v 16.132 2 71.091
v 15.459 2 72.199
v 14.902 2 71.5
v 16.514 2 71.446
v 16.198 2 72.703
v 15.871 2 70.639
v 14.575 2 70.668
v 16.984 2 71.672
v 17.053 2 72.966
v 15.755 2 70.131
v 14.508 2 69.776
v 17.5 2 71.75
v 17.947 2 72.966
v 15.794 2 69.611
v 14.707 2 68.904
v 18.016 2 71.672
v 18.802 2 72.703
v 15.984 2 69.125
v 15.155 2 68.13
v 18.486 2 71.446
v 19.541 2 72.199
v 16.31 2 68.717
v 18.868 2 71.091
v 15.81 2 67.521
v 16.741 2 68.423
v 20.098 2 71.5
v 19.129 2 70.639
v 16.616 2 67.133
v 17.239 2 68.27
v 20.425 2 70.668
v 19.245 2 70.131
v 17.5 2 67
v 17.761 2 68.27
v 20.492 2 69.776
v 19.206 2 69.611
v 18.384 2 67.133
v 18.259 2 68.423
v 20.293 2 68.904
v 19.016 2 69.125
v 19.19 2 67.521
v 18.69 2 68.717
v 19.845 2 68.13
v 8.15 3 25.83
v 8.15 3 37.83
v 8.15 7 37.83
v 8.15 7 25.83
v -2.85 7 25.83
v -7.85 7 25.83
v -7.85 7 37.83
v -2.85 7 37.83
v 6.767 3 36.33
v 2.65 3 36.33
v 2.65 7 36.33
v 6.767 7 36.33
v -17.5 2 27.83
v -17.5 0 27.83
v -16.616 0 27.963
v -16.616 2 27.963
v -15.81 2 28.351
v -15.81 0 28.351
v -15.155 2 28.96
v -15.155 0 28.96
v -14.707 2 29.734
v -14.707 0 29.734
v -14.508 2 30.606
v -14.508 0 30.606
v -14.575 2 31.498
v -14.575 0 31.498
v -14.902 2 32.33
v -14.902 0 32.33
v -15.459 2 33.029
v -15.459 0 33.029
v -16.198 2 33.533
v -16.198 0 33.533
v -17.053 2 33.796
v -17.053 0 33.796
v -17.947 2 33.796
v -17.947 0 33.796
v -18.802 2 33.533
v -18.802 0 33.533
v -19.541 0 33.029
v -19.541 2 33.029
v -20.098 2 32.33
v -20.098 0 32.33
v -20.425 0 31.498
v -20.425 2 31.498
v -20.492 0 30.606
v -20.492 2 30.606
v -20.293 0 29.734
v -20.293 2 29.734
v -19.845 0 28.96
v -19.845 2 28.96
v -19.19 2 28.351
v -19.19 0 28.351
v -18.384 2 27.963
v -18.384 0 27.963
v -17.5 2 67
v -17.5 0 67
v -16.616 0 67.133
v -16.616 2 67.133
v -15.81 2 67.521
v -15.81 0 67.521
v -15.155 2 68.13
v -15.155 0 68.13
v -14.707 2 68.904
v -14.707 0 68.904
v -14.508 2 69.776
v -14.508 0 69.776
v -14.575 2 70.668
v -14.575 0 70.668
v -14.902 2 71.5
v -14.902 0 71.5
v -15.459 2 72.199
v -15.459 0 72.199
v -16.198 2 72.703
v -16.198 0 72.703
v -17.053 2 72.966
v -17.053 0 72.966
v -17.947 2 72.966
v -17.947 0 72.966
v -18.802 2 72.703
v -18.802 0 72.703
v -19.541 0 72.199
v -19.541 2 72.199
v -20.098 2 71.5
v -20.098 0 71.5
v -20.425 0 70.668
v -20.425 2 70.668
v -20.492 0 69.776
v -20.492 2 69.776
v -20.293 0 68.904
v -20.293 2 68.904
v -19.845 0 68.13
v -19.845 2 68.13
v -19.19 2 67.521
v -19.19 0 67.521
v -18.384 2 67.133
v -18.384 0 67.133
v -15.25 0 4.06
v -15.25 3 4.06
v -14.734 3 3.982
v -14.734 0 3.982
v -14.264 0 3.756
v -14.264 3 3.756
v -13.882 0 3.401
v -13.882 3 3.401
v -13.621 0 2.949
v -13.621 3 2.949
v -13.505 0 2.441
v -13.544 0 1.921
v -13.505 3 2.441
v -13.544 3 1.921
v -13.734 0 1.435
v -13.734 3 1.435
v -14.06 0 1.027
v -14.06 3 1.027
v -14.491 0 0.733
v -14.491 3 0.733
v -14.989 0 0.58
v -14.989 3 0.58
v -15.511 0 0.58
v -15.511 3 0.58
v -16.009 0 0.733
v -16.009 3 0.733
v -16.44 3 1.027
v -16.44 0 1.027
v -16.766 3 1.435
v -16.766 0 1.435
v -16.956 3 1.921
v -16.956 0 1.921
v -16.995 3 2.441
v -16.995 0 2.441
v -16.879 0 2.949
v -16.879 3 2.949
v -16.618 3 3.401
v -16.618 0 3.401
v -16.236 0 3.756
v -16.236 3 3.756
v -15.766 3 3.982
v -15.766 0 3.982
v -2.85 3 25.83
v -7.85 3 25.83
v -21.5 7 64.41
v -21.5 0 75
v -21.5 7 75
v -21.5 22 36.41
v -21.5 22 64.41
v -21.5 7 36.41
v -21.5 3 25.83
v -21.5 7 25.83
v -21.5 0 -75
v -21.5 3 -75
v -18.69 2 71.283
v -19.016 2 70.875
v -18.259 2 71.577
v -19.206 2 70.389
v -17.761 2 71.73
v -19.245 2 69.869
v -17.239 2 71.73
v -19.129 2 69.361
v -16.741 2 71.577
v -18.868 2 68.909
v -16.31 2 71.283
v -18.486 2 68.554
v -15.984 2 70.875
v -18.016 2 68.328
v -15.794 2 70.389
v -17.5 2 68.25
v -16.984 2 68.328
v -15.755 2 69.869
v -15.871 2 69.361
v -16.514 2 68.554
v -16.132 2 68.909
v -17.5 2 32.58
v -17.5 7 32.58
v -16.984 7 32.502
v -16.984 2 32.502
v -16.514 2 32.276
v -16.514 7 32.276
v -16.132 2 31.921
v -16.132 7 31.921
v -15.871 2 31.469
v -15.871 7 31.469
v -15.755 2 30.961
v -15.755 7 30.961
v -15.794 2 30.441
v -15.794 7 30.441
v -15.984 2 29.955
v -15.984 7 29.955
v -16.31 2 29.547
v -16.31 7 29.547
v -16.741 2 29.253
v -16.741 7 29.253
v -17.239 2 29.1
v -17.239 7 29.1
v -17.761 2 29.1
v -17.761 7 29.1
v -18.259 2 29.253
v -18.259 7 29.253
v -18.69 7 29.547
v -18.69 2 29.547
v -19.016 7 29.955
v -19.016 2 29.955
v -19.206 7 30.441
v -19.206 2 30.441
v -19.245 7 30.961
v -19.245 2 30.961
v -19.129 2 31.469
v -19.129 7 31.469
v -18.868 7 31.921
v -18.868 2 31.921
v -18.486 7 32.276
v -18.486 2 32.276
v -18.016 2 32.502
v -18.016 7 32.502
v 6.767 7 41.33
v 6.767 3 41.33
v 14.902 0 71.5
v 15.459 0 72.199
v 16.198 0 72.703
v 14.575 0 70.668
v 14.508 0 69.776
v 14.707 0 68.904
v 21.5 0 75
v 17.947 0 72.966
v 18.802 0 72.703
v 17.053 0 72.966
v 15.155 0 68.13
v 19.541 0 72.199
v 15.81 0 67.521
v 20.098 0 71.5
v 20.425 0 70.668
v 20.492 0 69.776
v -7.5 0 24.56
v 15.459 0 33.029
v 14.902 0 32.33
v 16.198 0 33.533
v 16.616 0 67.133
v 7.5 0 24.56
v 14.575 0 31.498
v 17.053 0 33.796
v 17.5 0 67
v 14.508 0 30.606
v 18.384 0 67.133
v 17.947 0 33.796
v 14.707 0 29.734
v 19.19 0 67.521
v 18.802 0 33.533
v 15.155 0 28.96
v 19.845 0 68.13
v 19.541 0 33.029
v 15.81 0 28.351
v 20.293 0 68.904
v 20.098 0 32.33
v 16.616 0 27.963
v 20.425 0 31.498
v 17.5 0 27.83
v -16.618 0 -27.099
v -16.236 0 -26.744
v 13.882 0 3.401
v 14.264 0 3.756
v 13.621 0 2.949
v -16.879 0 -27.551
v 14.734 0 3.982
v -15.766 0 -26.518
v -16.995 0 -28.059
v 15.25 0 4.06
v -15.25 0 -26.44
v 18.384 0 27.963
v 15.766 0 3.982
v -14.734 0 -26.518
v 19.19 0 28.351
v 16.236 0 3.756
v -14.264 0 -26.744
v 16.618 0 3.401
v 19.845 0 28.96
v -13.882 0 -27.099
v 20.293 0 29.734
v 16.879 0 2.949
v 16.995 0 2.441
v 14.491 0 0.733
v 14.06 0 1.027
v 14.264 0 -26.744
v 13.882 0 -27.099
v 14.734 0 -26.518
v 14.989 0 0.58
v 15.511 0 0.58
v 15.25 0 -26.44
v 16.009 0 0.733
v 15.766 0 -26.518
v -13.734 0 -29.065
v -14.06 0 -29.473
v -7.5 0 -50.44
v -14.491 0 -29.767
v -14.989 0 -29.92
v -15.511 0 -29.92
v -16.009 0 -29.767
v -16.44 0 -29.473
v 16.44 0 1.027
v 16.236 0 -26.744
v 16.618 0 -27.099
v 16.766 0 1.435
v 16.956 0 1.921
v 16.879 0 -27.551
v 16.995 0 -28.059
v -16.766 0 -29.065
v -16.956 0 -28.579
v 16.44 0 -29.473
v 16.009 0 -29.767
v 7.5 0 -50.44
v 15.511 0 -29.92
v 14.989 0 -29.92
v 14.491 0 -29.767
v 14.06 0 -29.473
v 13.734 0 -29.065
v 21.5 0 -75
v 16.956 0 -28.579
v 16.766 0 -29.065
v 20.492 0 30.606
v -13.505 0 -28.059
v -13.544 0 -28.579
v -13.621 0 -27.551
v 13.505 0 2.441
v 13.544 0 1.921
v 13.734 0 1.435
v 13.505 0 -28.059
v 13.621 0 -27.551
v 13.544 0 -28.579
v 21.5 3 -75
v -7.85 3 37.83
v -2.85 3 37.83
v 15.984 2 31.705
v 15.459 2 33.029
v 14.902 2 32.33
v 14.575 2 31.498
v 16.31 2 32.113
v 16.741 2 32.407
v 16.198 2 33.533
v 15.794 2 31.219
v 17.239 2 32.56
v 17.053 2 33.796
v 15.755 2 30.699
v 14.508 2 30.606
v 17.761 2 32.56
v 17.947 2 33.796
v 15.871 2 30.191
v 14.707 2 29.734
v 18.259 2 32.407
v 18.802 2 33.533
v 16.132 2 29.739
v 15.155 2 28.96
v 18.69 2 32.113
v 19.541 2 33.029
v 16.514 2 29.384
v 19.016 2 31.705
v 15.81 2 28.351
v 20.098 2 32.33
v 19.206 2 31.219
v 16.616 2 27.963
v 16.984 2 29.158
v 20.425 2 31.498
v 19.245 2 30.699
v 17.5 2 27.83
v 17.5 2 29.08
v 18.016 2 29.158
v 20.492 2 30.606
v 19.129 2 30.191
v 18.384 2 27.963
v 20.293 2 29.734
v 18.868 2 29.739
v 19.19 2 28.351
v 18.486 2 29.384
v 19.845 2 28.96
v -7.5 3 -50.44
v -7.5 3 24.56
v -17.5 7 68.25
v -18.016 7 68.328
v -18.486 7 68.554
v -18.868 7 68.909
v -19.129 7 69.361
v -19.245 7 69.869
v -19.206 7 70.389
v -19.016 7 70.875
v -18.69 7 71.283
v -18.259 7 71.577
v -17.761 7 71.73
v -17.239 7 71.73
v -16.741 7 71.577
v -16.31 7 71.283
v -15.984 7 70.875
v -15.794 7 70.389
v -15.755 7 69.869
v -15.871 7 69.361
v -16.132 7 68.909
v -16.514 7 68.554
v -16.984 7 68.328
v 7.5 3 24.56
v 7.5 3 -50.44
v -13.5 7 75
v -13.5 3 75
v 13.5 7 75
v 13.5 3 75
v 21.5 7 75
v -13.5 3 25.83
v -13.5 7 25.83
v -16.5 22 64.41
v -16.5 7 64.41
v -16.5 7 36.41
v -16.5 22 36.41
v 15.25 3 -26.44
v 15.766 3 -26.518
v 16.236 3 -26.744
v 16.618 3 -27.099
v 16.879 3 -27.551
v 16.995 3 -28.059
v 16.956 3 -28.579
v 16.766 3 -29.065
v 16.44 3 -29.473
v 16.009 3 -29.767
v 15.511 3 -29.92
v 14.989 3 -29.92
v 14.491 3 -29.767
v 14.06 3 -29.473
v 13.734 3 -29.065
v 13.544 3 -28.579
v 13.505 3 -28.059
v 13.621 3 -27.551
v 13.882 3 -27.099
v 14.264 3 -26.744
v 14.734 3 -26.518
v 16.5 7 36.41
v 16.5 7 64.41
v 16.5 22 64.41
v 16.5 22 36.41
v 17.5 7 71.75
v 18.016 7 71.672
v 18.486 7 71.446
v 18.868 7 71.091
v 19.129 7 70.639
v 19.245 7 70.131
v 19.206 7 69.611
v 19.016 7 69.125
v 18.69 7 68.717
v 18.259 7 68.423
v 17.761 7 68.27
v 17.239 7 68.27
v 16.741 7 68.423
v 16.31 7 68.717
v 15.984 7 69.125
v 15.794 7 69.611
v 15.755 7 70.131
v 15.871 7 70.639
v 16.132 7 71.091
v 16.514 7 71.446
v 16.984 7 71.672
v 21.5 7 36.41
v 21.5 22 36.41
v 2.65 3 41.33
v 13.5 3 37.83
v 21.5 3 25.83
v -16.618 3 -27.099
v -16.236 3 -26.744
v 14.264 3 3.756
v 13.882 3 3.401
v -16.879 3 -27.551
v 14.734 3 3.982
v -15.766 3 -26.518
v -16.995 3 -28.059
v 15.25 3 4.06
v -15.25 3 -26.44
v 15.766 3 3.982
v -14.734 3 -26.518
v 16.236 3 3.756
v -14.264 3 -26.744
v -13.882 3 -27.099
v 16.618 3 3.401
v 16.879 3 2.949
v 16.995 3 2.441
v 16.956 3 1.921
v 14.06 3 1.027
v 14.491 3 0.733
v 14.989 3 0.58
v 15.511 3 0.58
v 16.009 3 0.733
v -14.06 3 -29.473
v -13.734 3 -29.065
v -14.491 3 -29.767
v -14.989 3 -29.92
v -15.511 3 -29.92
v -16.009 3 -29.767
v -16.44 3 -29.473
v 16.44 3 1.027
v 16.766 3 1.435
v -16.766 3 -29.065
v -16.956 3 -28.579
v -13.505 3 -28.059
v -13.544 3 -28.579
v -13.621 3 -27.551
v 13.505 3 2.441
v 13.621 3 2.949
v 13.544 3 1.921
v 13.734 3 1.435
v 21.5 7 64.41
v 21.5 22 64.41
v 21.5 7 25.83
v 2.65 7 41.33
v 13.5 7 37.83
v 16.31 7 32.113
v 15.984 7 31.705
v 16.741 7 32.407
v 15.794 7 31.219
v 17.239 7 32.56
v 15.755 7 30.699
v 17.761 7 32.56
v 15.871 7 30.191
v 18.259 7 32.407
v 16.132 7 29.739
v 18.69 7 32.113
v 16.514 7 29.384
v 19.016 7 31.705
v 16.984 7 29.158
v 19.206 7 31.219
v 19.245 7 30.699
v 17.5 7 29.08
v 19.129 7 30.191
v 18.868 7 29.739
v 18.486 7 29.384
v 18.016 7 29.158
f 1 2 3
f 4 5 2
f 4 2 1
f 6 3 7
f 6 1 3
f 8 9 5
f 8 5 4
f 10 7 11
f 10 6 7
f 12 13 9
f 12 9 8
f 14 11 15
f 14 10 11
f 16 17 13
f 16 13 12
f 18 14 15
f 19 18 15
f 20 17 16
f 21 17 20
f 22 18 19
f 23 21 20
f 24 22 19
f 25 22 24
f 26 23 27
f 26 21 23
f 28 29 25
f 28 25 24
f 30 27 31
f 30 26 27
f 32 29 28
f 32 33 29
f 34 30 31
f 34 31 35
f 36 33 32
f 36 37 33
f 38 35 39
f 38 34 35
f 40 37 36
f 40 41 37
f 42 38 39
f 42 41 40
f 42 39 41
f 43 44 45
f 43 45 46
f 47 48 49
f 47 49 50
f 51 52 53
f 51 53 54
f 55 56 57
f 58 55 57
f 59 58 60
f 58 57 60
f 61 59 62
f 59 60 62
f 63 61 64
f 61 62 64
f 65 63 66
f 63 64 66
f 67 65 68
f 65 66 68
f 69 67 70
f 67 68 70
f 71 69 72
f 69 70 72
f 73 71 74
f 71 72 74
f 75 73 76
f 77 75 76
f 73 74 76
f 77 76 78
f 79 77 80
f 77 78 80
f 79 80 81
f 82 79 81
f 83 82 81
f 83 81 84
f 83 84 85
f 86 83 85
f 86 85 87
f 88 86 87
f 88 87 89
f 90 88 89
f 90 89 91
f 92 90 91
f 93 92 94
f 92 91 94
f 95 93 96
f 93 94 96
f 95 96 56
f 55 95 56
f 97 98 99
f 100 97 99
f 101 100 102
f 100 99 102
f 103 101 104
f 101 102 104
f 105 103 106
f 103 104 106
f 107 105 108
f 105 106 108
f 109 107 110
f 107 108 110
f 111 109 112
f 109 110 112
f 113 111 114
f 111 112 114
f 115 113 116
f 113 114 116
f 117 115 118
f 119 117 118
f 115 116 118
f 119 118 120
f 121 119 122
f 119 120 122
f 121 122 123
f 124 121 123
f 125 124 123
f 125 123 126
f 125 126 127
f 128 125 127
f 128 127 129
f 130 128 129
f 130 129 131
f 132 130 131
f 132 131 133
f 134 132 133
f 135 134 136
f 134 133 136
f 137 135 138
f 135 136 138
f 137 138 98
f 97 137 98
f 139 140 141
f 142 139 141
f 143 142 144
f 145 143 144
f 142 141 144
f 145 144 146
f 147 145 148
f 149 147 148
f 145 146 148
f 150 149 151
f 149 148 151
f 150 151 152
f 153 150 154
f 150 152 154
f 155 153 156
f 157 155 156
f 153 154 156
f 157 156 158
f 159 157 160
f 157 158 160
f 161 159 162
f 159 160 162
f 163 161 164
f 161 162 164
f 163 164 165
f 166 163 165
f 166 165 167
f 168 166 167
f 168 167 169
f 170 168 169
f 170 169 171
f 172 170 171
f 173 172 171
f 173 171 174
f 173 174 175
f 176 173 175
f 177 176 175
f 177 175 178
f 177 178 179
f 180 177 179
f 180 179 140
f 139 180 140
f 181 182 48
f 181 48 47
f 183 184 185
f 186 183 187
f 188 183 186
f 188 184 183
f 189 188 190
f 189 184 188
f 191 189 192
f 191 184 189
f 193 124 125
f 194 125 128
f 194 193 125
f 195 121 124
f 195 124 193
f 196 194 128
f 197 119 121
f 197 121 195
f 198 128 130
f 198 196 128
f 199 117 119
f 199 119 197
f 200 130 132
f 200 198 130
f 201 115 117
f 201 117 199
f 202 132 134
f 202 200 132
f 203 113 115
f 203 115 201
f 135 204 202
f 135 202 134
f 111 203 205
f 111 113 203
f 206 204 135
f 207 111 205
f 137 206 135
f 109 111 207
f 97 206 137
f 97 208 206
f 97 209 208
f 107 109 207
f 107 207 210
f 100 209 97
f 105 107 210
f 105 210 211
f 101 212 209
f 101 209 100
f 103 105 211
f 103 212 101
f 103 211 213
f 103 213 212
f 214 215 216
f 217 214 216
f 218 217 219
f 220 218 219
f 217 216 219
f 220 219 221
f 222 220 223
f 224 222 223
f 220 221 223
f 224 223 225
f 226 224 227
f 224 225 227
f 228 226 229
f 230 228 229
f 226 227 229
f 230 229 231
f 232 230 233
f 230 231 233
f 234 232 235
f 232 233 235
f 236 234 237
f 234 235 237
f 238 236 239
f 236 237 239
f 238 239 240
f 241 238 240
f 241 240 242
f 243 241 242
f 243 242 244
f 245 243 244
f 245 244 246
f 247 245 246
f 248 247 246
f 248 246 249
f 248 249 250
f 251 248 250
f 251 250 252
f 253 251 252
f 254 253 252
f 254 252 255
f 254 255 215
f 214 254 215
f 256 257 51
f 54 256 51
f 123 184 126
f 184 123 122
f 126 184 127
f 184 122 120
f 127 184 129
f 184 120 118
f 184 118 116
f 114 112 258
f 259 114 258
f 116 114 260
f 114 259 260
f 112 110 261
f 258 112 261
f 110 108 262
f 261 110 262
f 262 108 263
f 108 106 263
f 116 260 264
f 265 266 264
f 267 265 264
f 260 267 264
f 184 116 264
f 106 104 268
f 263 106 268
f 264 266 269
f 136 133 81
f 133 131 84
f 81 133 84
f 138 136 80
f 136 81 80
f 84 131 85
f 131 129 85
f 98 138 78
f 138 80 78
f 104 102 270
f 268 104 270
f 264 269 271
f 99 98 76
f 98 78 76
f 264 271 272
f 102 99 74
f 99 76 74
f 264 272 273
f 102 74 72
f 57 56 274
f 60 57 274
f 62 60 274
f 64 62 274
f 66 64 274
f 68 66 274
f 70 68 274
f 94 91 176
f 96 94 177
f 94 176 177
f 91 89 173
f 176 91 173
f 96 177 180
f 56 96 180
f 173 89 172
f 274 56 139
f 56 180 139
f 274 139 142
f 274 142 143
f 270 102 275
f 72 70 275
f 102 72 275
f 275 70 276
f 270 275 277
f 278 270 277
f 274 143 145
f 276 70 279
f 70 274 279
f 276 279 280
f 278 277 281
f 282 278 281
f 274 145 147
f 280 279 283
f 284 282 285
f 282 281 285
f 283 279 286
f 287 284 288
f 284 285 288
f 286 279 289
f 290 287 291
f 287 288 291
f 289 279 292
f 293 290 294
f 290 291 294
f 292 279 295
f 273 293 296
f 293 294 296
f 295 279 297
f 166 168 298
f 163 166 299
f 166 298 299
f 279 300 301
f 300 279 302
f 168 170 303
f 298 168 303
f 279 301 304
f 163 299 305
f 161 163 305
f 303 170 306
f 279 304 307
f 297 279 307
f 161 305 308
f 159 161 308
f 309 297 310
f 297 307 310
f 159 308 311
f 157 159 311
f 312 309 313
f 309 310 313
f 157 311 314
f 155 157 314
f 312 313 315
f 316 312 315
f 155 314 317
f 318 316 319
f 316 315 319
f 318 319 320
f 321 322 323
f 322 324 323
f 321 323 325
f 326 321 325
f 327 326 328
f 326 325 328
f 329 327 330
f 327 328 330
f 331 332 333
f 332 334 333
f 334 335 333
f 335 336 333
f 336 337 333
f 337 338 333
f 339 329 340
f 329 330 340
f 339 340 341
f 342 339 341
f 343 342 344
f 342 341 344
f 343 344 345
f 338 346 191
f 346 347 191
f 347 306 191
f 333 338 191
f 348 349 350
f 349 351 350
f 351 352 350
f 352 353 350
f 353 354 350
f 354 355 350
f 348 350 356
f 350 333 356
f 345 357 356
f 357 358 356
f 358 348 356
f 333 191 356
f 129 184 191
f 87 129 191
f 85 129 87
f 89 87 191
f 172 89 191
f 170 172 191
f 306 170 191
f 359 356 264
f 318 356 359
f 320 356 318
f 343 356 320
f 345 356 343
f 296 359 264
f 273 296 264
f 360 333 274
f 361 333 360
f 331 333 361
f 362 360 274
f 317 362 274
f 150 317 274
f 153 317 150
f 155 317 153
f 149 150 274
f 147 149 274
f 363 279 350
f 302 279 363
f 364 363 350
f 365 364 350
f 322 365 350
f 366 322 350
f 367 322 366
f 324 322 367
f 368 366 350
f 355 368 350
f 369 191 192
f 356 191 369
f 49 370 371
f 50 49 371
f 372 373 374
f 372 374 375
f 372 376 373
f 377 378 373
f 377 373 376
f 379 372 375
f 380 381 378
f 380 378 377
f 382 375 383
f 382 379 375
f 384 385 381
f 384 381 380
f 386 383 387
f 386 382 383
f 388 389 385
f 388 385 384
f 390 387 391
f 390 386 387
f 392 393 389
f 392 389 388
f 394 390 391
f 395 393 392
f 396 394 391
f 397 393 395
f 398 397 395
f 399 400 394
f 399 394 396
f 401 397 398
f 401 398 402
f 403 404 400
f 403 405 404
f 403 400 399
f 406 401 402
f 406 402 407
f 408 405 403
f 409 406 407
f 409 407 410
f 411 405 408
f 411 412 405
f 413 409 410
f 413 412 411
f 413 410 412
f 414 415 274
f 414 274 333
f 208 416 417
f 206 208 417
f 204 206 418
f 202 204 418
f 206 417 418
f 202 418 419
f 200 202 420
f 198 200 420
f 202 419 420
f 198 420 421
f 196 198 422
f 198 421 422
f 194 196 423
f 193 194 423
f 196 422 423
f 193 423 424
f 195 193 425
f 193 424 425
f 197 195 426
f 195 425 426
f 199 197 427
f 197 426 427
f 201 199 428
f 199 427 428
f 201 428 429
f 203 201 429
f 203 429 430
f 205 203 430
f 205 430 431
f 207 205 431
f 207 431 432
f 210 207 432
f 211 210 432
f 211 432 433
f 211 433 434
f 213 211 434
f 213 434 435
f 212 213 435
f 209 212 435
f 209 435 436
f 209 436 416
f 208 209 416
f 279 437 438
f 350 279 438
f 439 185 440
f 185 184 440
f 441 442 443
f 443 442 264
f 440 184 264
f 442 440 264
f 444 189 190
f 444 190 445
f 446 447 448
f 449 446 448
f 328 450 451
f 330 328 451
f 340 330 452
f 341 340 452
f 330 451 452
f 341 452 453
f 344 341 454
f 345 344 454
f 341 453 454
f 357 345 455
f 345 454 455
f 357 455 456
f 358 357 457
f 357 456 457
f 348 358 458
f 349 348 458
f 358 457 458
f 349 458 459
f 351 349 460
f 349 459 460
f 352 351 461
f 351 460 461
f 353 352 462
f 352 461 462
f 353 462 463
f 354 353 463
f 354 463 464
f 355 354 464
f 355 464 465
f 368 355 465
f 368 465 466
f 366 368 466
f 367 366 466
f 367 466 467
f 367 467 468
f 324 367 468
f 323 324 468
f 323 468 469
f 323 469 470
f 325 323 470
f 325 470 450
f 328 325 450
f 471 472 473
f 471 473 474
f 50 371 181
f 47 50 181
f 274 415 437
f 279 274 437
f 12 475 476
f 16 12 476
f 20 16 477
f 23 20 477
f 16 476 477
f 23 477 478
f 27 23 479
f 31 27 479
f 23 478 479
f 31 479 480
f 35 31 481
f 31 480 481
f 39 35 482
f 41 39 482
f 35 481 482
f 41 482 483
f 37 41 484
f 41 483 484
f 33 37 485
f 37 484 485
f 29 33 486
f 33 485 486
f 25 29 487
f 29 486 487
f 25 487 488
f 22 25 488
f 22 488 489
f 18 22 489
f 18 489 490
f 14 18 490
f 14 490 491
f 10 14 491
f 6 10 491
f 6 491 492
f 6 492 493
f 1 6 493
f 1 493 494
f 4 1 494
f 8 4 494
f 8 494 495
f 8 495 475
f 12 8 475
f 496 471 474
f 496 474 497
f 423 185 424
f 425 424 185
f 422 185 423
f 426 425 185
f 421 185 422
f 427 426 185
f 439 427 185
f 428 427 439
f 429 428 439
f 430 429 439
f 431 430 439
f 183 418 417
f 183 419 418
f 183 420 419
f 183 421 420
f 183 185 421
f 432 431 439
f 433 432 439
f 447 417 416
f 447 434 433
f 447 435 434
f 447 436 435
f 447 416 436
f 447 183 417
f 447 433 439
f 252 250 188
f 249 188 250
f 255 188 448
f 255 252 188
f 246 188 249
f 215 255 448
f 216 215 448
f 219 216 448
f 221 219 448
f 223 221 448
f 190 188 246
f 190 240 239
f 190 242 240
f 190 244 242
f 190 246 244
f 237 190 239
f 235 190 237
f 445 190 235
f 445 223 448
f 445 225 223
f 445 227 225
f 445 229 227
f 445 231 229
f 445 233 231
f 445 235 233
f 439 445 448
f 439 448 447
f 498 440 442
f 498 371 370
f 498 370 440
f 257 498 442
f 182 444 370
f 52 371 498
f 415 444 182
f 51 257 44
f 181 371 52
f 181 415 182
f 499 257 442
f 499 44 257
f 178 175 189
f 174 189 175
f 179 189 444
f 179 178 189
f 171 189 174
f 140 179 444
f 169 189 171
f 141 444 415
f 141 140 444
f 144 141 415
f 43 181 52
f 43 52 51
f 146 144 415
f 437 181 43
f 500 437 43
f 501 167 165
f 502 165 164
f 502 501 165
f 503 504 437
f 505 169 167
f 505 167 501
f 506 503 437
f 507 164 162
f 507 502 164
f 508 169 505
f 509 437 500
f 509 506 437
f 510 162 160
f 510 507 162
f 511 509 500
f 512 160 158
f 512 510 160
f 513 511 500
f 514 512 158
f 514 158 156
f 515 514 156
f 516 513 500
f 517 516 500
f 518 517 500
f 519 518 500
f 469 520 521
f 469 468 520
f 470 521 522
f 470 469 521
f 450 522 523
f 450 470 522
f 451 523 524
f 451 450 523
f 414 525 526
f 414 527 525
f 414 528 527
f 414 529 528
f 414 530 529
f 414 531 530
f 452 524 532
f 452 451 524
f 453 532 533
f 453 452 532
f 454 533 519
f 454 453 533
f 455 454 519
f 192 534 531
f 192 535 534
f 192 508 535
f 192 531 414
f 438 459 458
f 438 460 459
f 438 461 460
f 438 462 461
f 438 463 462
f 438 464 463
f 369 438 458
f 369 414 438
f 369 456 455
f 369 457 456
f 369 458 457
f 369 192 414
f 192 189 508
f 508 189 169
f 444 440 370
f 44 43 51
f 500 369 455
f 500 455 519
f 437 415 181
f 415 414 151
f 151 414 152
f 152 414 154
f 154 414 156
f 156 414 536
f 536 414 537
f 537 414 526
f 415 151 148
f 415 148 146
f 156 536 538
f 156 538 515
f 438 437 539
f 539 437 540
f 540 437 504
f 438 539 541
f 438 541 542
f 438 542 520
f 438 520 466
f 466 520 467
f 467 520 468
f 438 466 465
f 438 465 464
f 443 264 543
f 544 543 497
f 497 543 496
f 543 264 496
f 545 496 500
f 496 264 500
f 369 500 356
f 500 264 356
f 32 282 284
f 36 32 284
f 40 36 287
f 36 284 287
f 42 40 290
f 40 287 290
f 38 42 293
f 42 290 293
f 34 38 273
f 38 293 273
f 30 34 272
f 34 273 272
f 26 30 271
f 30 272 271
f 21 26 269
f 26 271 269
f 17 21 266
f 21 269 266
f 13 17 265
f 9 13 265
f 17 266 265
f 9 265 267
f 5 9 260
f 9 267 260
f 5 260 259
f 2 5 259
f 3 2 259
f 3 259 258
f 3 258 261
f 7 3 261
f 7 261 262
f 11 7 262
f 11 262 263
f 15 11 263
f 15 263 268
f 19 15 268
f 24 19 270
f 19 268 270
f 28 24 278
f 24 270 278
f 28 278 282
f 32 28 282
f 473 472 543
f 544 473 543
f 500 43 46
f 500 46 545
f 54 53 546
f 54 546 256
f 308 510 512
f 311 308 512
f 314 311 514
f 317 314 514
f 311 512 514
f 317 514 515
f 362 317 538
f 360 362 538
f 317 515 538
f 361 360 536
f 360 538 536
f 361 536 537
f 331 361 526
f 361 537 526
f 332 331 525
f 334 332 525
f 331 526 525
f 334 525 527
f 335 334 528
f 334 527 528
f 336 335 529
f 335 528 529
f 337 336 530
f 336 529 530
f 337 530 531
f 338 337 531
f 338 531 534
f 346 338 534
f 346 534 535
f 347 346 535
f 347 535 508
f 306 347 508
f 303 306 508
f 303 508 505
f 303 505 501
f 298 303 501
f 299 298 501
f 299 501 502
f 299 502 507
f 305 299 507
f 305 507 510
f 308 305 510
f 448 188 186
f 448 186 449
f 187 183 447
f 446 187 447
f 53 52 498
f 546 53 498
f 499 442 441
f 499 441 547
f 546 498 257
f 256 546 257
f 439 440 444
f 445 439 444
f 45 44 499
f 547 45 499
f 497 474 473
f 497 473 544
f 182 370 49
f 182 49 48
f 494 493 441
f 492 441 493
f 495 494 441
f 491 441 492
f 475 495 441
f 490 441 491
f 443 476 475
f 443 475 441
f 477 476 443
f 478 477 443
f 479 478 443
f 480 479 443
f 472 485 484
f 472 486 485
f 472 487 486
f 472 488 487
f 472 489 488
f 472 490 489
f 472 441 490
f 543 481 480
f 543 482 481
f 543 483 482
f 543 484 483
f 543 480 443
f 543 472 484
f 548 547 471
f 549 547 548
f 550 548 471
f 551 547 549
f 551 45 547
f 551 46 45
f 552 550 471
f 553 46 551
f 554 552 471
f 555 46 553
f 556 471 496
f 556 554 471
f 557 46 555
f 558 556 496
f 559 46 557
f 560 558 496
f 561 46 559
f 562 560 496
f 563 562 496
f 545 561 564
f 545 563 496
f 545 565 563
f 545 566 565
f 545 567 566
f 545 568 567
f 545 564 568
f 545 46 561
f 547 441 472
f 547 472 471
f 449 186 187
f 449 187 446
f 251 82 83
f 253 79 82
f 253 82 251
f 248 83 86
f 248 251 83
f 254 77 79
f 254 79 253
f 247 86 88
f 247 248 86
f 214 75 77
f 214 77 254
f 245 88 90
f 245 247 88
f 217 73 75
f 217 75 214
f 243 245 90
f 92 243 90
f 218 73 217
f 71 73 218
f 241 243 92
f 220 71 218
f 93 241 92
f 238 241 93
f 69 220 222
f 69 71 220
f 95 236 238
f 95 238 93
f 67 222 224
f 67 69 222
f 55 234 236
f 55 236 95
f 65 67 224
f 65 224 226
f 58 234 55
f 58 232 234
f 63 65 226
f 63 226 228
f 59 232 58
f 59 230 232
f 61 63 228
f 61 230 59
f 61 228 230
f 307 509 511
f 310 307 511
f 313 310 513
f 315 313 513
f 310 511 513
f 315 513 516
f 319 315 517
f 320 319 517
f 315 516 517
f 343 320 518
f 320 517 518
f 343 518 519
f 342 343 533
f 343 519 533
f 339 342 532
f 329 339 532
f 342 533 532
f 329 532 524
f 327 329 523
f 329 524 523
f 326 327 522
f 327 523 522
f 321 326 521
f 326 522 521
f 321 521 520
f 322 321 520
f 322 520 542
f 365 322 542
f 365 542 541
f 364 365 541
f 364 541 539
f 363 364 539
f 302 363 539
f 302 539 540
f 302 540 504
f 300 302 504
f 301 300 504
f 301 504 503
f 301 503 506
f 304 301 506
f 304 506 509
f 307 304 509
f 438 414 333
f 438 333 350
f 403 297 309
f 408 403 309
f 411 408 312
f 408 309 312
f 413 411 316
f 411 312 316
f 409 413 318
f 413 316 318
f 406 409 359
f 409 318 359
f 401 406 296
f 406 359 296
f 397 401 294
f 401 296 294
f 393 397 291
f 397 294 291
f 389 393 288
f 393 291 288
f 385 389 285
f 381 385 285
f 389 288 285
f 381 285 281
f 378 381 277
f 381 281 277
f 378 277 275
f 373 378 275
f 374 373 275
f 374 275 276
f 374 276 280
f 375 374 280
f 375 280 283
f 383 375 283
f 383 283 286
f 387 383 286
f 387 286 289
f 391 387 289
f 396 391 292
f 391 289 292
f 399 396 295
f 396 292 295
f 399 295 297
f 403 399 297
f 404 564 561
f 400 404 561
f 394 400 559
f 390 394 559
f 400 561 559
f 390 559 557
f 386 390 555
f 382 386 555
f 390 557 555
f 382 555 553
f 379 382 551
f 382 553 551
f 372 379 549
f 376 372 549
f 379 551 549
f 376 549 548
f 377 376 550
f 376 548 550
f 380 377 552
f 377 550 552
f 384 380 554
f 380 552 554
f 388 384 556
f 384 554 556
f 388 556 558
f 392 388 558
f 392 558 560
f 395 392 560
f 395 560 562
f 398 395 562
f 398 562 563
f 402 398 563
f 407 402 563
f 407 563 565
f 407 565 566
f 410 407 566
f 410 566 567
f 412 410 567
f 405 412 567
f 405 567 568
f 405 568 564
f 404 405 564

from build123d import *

# Parameters (mm, degrees)
SKETCH1_W           = 43
SKETCH1_H           = 150
BOSS_EXTRUDE1_DEPTH = 3
SKETCH2_R           = 1.75
CUT_EXTRUDE1_DEPTH  = 10
SKETCH3_W           = 15
SKETCH3_H           = 75
CUT_EXTRUDE2_DEPTH  = 10
SKETCH4_W           = 5
SKETCH4_H           = 12
SKETCH4_W_2         = 4.116849784
SKETCH4_H_2         = 1.5
SKETCH4_H_3         = 3.5
BOSS_EXTRUDE2_DEPTH = 4
SKETCH5_W           = 8
SKETCH5_H           = 49.17
BOSS_EXTRUDE3_DEPTH = 4
SKETCH7_W           = 0.35
SKETCH7_H           = 12
BOSS_EXTRUDE4_DEPTH = 4
SKETCH8_R           = 1.75
CUT_EXTRUDE3_DEPTH  = 79.334219853
SKETCH9_W           = 5
SKETCH9_H           = 28
BOSS_EXTRUDE5_DEPTH = 15
SKETCH10_R          = 3
CUT_EXTRUDE5_DEPTH  = 2


with BuildPart() as part:
    # Sketch1 → Boss-Extrude1 (new body)
    with BuildSketch(Plane(origin=(0, 0, 0), x_dir=(1, 0, 0), z_dir=(0, 1, 0))):
        Rectangle(SKETCH1_W, SKETCH1_H)
    extrude(amount=BOSS_EXTRUDE1_DEPTH)

    # Sketch2 → Cut-Extrude1 (cut)
    with BuildSketch(Plane(origin=(0, 3, 0), x_dir=(1, 0, 0), z_dir=(0, 1, 0))):
        with Locations(Location((15.25, 28.19, 0), (0, 0, 270))):
            Circle(SKETCH2_R)
        with Locations(Location((-15.25, 28.19, 0), (0, 0, 270))):
            Circle(SKETCH2_R)
        with Locations(Location((-15.25, -2.31, 0), (0, 0, 270))):
            Circle(SKETCH2_R)
        with Locations(Location((15.25, -2.31, 0), (0, 0, 270))):
            Circle(SKETCH2_R)
    extrude(amount=-CUT_EXTRUDE1_DEPTH, mode=Mode.SUBTRACT)

    # Sketch3 → Cut-Extrude2 (cut)
    with BuildSketch(Plane(origin=(0, 3, 0), x_dir=(1, 0, 0), z_dir=(0, 1, 0))):
        with Locations((0, 12.94)):
            Rectangle(SKETCH3_W, SKETCH3_H)
    extrude(amount=-CUT_EXTRUDE2_DEPTH, mode=Mode.SUBTRACT)

    # Sketch4 → Boss-Extrude2 (add)
    with BuildSketch(Plane(origin=(0, 3, 0), x_dir=(1, 0, 0), z_dir=(0, 1, 0))):
        with Locations((-5.35, -31.83)):
            Rectangle(SKETCH4_W, SKETCH4_H)
        with Locations((10.65, -31.83)):
            Rectangle(SKETCH4_W, SKETCH4_H)
        with Locations((4.708424892, -37.08)):
            Rectangle(SKETCH4_W_2, SKETCH4_H_2)
        with Locations((4.708424892, -39.58)):
            Rectangle(SKETCH4_W_2, SKETCH4_H_3)
    extrude(amount=BOSS_EXTRUDE2_DEPTH)

    # Sketch5 → Boss-Extrude3 (add)
    with BuildSketch(Plane(origin=(0, 3, 0), x_dir=(1, 0, 0), z_dir=(0, 1, 0))):
        with Locations((-17.5, -50.415)):
            Rectangle(SKETCH5_W, SKETCH5_H)
        with Locations((17.5, -50.415)):
            Rectangle(SKETCH5_W, SKETCH5_H)
    extrude(amount=BOSS_EXTRUDE3_DEPTH)

    # Sketch7 → Boss-Extrude4 (add)
    with BuildSketch(Plane(origin=(0, 3, 0), x_dir=(1, 0, 0), z_dir=(0, 1, 0))):
        with Locations((13.325, -31.83)):
            Rectangle(SKETCH7_W, SKETCH7_H)
    extrude(amount=BOSS_EXTRUDE4_DEPTH)

    # Sketch8 → Cut-Extrude3 (cut, through all)
    with BuildSketch(Plane(origin=(0, 7, 0), x_dir=(1, 0, 0), z_dir=(0, 1, 0))):
        with Locations(Location((17.5, -70, 0), (0, 0, 270))):
            Circle(SKETCH8_R)
        with Locations(Location((17.5, -30.83, 0), (0, 0, 90))):
            Circle(SKETCH8_R)
        with Locations(Location((-17.5, -70, 0), (0, 0, 90))):
            Circle(SKETCH8_R)
        with Locations(Location((-17.5, -30.83, 0), (0, 0, 270))):
            Circle(SKETCH8_R)
    extrude(amount=-CUT_EXTRUDE3_DEPTH, mode=Mode.SUBTRACT)

    # Sketch9 → Boss-Extrude5 (add)
    with BuildSketch(Plane(origin=(0, 7, 0), x_dir=(1, 0, 0), z_dir=(0, 1, 0))):
        with Locations((19, -50.41)):
            Rectangle(SKETCH9_W, SKETCH9_H)
        with Locations((-19, -50.41)):
            Rectangle(SKETCH9_W, SKETCH9_H)
    extrude(amount=BOSS_EXTRUDE5_DEPTH)

    # Sketch10 → Cut-Extrude5 (cut)
    with BuildSketch(Plane.XZ):
        with Locations(Location((-17.5, 70, 0), (0, 0, 270))):
            Circle(SKETCH10_R)
        with Locations(Location((-17.5, 30.83, 0), (0, 0, 270))):
            Circle(SKETCH10_R)
        with Locations(Location((17.5, 30.83, 0), (0, 0, 270))):
            Circle(SKETCH10_R)
        with Locations(Location((17.5, 70, 0), (0, 0, 270))):
            Circle(SKETCH10_R)
    extrude(amount=-CUT_EXTRUDE5_DEPTH, mode=Mode.SUBTRACT)


solid = part.part
